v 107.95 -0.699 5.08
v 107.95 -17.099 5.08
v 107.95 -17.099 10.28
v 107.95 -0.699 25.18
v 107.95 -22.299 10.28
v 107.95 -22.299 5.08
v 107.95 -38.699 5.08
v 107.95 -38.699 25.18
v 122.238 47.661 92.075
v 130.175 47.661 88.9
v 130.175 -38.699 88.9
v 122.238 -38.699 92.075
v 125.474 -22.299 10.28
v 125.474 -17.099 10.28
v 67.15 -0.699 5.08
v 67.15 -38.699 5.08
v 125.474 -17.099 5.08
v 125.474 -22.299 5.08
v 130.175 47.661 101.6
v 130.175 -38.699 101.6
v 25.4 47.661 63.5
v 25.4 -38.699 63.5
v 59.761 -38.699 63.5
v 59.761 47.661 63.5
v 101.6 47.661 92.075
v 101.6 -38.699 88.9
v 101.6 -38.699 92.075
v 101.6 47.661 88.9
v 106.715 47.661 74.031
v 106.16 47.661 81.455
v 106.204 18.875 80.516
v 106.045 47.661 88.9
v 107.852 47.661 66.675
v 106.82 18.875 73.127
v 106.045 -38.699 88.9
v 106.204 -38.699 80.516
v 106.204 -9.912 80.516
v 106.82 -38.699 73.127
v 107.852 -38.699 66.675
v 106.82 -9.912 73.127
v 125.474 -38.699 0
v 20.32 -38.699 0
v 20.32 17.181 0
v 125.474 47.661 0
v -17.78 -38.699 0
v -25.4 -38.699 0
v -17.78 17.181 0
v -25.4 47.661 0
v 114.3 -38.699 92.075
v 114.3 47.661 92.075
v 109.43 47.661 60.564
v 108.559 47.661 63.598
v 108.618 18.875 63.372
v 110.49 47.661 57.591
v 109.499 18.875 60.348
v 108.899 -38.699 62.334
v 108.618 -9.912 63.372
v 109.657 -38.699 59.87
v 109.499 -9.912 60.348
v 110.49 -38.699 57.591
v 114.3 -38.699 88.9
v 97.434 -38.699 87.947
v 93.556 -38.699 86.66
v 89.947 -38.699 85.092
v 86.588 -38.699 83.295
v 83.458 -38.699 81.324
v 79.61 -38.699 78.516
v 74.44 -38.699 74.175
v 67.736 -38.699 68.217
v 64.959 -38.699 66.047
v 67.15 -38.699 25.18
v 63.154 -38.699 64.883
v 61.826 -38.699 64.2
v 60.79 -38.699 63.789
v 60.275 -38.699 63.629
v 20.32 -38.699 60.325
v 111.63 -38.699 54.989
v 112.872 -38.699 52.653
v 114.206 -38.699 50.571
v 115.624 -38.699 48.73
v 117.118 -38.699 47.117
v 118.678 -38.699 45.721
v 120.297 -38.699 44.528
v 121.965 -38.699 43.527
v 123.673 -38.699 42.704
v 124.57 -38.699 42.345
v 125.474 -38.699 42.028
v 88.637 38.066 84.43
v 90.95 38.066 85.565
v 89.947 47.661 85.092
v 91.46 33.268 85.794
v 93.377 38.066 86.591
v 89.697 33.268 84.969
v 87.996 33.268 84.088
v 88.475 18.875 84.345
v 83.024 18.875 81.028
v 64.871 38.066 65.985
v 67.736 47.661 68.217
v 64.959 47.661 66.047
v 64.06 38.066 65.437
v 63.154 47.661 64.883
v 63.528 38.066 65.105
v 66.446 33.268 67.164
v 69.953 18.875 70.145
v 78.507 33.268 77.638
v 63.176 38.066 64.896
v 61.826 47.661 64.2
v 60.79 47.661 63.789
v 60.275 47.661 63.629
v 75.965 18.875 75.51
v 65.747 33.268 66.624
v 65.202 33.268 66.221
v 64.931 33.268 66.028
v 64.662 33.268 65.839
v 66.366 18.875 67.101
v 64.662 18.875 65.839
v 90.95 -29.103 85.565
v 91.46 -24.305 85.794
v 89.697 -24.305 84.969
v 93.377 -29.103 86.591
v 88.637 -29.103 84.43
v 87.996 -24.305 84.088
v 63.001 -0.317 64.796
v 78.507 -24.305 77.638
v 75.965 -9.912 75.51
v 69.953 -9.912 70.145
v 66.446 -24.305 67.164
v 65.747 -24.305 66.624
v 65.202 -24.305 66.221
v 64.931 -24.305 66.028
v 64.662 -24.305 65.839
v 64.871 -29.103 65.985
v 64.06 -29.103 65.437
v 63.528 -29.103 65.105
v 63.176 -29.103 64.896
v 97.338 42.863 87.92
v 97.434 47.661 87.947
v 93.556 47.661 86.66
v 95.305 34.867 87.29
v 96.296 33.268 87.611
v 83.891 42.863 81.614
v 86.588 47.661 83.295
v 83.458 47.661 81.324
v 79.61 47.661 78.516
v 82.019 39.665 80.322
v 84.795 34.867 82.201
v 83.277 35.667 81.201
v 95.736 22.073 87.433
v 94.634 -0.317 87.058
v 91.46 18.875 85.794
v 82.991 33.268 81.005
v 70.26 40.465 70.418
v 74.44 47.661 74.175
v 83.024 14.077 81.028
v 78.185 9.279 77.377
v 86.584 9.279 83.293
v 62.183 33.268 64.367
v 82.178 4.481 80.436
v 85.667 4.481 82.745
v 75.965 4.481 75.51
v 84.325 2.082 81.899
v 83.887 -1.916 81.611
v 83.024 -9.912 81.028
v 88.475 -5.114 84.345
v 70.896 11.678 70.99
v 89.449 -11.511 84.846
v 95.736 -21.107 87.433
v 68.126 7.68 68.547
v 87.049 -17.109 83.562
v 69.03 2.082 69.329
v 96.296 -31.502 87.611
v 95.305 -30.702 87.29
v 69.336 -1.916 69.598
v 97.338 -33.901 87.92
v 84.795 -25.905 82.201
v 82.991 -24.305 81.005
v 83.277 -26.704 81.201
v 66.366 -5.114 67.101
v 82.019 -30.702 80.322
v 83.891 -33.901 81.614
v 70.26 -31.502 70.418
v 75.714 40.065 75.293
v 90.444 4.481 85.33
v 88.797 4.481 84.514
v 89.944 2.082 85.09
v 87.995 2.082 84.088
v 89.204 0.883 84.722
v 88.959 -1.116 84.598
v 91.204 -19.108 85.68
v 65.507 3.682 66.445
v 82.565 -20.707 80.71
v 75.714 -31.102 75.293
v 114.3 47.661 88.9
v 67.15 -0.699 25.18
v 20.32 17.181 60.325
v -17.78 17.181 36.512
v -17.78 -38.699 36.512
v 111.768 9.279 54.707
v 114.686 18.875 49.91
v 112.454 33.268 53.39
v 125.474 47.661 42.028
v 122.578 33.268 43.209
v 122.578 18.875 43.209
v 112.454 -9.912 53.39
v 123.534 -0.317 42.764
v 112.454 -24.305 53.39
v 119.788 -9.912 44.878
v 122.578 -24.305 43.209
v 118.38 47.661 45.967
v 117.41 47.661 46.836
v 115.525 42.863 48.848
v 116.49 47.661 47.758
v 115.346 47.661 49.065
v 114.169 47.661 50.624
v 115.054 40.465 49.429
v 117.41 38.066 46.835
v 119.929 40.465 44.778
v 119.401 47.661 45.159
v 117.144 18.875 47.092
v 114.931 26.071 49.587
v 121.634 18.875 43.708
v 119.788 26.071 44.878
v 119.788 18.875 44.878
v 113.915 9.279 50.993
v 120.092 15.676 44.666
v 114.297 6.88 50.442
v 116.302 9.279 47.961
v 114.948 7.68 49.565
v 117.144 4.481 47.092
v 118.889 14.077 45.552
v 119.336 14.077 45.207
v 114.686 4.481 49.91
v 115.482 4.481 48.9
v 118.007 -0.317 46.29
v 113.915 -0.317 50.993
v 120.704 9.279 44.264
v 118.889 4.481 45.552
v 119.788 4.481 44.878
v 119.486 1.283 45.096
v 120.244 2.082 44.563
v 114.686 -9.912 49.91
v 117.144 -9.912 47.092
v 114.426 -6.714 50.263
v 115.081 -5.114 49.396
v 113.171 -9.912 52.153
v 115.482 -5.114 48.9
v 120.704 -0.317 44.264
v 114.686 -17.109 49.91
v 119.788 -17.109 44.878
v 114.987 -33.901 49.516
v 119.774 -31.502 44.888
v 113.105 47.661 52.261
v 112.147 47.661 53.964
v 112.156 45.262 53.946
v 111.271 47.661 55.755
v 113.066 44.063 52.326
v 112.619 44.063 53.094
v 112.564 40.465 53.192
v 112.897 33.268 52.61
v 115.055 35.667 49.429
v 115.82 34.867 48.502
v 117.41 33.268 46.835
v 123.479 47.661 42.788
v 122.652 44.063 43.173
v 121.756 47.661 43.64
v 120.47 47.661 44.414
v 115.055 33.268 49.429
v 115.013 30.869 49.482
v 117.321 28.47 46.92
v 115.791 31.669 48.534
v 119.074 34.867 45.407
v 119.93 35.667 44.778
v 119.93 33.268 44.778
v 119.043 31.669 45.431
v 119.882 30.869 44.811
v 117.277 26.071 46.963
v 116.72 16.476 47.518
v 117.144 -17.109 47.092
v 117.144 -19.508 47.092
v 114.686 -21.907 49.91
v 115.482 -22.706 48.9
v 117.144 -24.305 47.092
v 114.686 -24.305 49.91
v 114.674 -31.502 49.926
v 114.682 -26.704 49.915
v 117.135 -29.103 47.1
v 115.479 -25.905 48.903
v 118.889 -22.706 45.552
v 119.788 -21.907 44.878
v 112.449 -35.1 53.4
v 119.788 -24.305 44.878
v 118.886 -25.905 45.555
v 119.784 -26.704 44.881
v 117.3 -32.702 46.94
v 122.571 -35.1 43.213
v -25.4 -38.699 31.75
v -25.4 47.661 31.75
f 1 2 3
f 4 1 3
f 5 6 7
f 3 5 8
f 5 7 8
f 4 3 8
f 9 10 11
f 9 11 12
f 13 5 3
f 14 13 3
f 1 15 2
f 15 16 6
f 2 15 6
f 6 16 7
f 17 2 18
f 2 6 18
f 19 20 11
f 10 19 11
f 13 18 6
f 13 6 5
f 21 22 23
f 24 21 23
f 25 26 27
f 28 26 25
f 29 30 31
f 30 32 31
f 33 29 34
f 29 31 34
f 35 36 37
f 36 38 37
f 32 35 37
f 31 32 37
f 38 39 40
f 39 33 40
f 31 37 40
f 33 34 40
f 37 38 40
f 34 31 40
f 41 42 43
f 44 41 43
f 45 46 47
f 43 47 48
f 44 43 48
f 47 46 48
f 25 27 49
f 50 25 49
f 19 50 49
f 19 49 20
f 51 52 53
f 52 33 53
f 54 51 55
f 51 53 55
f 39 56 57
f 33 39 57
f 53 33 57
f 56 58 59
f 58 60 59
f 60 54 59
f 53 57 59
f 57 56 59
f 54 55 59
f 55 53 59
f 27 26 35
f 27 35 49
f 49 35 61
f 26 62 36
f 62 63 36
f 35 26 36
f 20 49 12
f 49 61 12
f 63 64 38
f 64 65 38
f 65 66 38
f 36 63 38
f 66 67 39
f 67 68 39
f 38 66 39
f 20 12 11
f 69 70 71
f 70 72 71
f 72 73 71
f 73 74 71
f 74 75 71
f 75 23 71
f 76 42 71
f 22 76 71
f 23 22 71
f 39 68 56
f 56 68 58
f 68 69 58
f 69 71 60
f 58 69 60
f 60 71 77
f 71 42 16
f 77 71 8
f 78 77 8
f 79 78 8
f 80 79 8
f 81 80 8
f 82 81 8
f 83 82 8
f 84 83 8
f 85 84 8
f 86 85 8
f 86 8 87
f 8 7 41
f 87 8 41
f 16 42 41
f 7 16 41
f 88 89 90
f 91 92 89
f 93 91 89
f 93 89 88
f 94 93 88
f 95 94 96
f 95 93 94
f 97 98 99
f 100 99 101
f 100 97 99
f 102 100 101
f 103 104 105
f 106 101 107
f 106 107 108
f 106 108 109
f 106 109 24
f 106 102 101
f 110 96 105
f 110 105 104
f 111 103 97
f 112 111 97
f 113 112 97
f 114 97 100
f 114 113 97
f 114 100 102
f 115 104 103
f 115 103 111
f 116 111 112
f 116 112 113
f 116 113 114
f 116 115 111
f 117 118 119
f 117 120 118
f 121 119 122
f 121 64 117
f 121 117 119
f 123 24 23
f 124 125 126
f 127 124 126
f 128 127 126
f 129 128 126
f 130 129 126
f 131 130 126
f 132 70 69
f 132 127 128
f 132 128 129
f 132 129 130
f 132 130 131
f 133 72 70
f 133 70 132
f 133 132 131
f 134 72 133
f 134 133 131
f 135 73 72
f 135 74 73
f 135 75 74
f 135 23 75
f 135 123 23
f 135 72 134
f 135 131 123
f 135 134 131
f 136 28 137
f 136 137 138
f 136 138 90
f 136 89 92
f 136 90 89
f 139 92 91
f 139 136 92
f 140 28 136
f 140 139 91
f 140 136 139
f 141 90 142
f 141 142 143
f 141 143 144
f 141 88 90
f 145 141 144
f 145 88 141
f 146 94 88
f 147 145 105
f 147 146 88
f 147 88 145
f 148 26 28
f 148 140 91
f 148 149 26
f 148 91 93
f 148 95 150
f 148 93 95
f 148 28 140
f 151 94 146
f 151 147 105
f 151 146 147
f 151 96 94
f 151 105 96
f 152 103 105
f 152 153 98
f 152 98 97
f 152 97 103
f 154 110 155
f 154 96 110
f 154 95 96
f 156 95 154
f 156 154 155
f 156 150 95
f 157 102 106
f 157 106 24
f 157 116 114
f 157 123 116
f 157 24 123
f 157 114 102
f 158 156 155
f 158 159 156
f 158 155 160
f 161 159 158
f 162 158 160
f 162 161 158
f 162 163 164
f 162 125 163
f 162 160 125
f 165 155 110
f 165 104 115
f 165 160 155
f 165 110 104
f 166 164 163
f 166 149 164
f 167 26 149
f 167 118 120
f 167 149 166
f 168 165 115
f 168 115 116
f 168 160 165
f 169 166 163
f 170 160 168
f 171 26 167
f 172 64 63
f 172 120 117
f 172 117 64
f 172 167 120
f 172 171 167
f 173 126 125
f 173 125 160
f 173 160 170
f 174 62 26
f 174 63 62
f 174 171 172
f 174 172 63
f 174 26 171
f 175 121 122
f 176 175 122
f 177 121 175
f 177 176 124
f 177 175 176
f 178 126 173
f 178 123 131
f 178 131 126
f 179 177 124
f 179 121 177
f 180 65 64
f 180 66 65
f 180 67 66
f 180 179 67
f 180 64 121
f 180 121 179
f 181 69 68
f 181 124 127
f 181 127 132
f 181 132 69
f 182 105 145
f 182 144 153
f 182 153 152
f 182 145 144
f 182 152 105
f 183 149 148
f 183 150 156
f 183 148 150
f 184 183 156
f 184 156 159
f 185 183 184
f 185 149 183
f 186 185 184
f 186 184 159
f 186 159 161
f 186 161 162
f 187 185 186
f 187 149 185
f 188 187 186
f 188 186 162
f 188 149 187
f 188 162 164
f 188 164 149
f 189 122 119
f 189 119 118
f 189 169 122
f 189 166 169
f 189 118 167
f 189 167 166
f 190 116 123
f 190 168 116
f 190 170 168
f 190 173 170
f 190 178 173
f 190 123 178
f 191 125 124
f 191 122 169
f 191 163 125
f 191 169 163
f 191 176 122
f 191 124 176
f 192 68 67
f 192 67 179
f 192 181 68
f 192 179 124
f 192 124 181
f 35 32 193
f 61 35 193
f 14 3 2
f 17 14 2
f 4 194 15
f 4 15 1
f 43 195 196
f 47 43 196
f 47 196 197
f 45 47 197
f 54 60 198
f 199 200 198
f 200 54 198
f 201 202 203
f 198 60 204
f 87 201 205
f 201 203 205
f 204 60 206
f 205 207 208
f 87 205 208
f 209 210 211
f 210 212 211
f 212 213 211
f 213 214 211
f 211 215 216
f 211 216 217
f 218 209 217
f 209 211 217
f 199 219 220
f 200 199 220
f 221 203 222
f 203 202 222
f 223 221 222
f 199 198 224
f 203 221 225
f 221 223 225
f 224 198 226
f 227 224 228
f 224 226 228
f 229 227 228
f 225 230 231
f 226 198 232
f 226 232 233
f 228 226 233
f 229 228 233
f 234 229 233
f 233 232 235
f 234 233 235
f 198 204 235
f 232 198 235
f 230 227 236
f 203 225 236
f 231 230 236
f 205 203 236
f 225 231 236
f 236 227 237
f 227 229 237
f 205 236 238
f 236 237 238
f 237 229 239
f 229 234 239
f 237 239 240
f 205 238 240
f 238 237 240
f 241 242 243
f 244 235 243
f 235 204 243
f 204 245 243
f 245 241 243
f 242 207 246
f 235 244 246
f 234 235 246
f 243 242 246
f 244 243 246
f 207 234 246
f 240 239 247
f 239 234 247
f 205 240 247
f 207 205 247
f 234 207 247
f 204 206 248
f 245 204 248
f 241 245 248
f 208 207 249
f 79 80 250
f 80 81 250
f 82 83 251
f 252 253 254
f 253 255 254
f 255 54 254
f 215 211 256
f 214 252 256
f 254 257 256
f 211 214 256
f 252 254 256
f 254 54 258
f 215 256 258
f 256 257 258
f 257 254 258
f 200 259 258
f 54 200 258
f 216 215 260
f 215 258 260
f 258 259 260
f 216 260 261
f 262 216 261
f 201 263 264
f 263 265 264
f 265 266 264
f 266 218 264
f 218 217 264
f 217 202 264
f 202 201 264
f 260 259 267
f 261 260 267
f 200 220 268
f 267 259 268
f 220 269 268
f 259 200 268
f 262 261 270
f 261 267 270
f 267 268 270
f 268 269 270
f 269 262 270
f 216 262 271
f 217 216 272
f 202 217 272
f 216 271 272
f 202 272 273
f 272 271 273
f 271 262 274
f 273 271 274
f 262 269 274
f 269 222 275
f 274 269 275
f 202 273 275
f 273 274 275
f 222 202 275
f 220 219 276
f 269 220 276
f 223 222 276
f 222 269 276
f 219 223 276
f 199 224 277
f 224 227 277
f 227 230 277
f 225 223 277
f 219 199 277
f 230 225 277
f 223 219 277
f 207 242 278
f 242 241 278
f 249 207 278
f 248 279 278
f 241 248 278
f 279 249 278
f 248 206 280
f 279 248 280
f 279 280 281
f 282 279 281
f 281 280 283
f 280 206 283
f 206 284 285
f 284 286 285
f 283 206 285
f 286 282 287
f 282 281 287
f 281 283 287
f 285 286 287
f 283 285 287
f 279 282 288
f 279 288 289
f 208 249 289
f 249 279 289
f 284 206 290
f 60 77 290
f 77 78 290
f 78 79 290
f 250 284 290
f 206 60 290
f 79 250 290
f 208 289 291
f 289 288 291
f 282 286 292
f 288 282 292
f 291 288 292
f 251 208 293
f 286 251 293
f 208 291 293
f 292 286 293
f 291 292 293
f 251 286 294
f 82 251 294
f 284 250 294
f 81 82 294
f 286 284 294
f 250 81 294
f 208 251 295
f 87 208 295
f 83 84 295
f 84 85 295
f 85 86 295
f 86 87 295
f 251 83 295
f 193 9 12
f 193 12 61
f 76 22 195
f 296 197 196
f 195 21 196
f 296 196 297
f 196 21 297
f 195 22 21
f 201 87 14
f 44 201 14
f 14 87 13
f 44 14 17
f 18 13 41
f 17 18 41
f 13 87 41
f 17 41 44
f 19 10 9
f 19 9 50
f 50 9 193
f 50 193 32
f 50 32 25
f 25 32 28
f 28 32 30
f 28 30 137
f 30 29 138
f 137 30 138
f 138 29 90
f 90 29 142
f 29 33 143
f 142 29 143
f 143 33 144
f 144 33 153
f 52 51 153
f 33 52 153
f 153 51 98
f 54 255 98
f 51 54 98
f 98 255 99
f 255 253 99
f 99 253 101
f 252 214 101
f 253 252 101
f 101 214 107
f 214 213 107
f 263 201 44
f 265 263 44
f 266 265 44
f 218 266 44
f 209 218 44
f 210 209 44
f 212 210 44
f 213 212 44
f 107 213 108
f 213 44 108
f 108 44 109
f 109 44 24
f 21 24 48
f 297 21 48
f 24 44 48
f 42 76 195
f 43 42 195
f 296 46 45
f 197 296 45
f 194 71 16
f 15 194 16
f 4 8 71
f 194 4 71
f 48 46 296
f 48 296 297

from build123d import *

# Parameters (mm, degrees)
F0_W      = 50.8
F0_H      = 86.36
F1_DEPTH  = 63.5
F2_W      = 20.32
F2_H      = 43.18
F2_W_2    = 17.78
F2_H_2    = 12.7
F3_DEPTH  = 228.6
F5_DEPTH  = 228.6
F6_W      = 86.36
F6_H      = 50.8
F6_H_2    = 63.5
F7_DEPTH  = 127
F9_W      = 127
F9_H      = 50.8
F10_DEPTH = 228.6
F12_DEPTH = 37.999924
F13_DEPTH = 86.36
F15_DEPTH = 101.6
F16_W     = 41.91
F16_H     = 22.225
F17_DEPTH = 228.6
F18_W     = 46.355
F18_H     = 86.36
F18_W_2   = 4.445
F19_DEPTH = 12.7
F20_W     = 12.7
F20_H     = 9.525
F20_W_2   = 3.175
F20_W_3   = 6.35
F20_H_2   = 3.175
F21_DEPTH = 228.6
F23_DEPTH = 228.6
F25_DEPTH = 59.69


with BuildPart() as f1:
    # F0 (on Top) → F1 (new body)
    with BuildSketch(Plane.XY):
        with Locations((0, 4.4812522829)):
            Rectangle(F0_W, F0_H)
    extrude(amount=F1_DEPTH)

    # F2 (on face) → F3 (cut)
    with BuildSketch(Plane.XY.offset(63.5)):
        with Locations((10.16, -17.1087477171)):
            Rectangle(F2_W, F2_H)
        with Locations((-8.89, -17.1087477171)):
            Rectangle(F2_W_2, F2_H)
        with Locations((-8.89, 10.8312522829)):
            Rectangle(F2_W_2, F2_H_2)
        with Locations((10.16, 10.8312522829)):
            Rectangle(F2_W, F2_H_2)
    extrude(amount=-F3_DEPTH, mode=Mode.SUBTRACT)

    # F4 (on face) → F5 (cut)
    with BuildSketch(Plane(origin=(0, 47.6612522829, 0), x_dir=(-1, 0, 0), z_dir=(0, 1, 0))):
        Polygon((-25.4, 63.5), (25.4, 31.75), (25.4, 63.5), align=None)
    extrude(amount=-F5_DEPTH, mode=Mode.SUBTRACT)

    # F6 (on face) → F7 (join)
    with BuildSketch(Plane.YZ.offset(25.4)):
        with Locations((4.4812522829, 88.9)):
            Rectangle(F6_W, F6_H)
        with Locations((4.4812522829, 31.75)):
            Rectangle(F6_W, F6_H_2)
    extrude(amount=F7_DEPTH)

    # F9 (on face) → F10 (cut)
    with BuildSketch(Plane.XZ.offset(38.6987477171)):
        with Locations((88.9, 88.9)):
            Rectangle(F9_W, F9_H)
    extrude(amount=-F10_DEPTH, mode=Mode.SUBTRACT)

    # F11 (on face) → F12 (cut)
    with BuildSketch(Plane.XZ.offset(38.6987477171)):
        Polygon((107.95, 5.08), (107.95, 13.3552532643), (107.95, 25.18000044), (67.1500054, 25.18000044), (67.1500054, 5.08), align=None)
    extrude(amount=-F12_DEPTH, mode=Mode.SUBTRACT)

    # F8 (on face) → F13 (join)
    with BuildSketch(Plane.XZ.offset(38.6987477171)):
        with BuildLine():
            Line((59.7608433873, 63.5), (101.6, 63.5))
            Line((101.6, 63.5), (101.6, 88.9))
            add(Edge.make_bspline(
                [(101.6, 88.9), (79.3954620772, 84.9506698417), (69.3900678517, 65.6088911006), (59.7608433873, 63.5)],
                knots=[0, 0, 0, 0, 0.338800951, 0.338800951, 0.338800951, 0.338800951], degree=3))
        make_face()
        Polygon((101.6, 88.9), (101.6, 63.5), (152.4, 63.5), (152.4, 114.3), (101.6, 114.3), align=None)
    extrude(amount=-F13_DEPTH)

    # F14 (on face) → F15 (cut)
    with BuildSketch(Plane.YZ.offset(152.4)):
        Polygon((47.6612522829, 114.3), (-38.6987477171, 114.3), (-38.6987477171, 88.9), (47.6612522829, 88.9), (47.6612522829, 101.6), align=None)
    extrude(amount=-F15_DEPTH, mode=Mode.SUBTRACT)

    # F16 (on face) → F17 (cut)
    with BuildSketch(Plane.XZ.offset(38.6987477171)):
        with BuildLine():
            Line((110.49, 88.9), (106.045, 88.9))
            add(Edge.make_bspline(
                [(106.045, 88.9), (105.9615328839, 79.9996478624), (106.6244970851, 72.6786467547), (107.8523208869, 66.675)],
                knots=[0, 0, 0, 0, 0.1081078186, 0.1081078186, 0.1081078186, 0.1081078186], degree=3))
            Line((107.8523208869, 66.675), (110.49, 66.675))
            Line((110.49, 66.675), (110.49, 88.9))
        make_face()
        with Locations((131.445, 77.7875)):
            Rectangle(F16_W, F16_H)
        with BuildLine():
            add(Edge.make_bspline(
                [(125.4735723701, 42.0280762083), (135.9858471133, 38.600025516), (147.748179628, 43.4285939835), (152.4, 44.45)],
                knots=[0.3864894569, 0.3864894569, 0.3864894569, 0.3864894569, 0.7739727648, 0.7739727648, 0.7739727648, 0.7739727648], degree=3))
            Line((125.4735723701, 42.0280762083), (125.4735723701, 0))
            Line((125.4735723701, 0), (152.4, 0))
            Line((152.4, 0), (152.4, 44.45))
        make_face()
        with BuildLine():
            Line((152.4, 66.675), (110.49, 66.675))
            Line((110.49, 66.675), (110.49, 57.590838654))
            add(Edge.make_bspline(
                [(110.49, 57.590838654), (114.1247988782, 48.4297517127), (119.6043502671, 43.9420283629), (125.4735723701, 42.0280762083)],
                knots=[0.1701494495, 0.1701494495, 0.1701494495, 0.1701494495, 0.3864894569, 0.3864894569, 0.3864894569, 0.3864894569], degree=3))
            add(Edge.make_bspline(
                [(125.4735723701, 42.0280762083), (135.9858471133, 38.600025516), (147.748179628, 43.4285939835), (152.4, 44.45)],
                knots=[0.3864894569, 0.3864894569, 0.3864894569, 0.3864894569, 0.7739727648, 0.7739727648, 0.7739727648, 0.7739727648], degree=3))
            Line((152.4, 44.45), (152.4, 66.675))
        make_face()
        with BuildLine():
            Line((110.49, 66.675), (107.8523208869, 66.675))
            add(Edge.make_bspline(
                [(107.8523208869, 66.675), (108.556952542, 63.2295874388), (109.4476183658, 60.2180400746), (110.49, 57.590838654)],
                knots=[0.1081078186, 0.1081078186, 0.1081078186, 0.1081078186, 0.1701494495, 0.1701494495, 0.1701494495, 0.1701494495], degree=3))
            Line((110.49, 57.590838654), (110.49, 66.675))
        make_face()
    extrude(amount=-F17_DEPTH, mode=Mode.SUBTRACT)

    # F18 (on face) → F19 (join)
    with BuildSketch(Plane.XY.offset(88.9)):
        with Locations((129.2225, 4.4812522829)):
            Rectangle(F18_W, F18_H)
        with Locations((103.8225, 4.4812522829)):
            Rectangle(F18_W_2, F18_H)
    extrude(amount=F19_DEPTH)

    # F20 (on face) → F21 (cut)
    with BuildSketch(Plane.XZ.offset(38.6987477171)):
        with Locations((107.95, 96.8375)):
            Rectangle(F20_W, F20_H)
        Polygon((127, 99.695), (127, 101.6), (114.3, 101.6), (114.3, 92.075), align=None)
        Polygon((127, 99.695), (130.175, 101.6), (127, 101.6), align=None)
        with Locations((131.7625, 96.8375)):
            Rectangle(F20_W_2, F20_H)
        with Locations((136.525, 96.8375)):
            Rectangle(F20_W_3, F20_H)
        with Locations((131.7625, 90.4875)):
            Rectangle(F20_W_2, F20_H_2)
        with Locations((136.525, 90.4875)):
            Rectangle(F20_W_3, F20_H_2)
        Polygon((152.4, 95.25), (152.4, 101.6), (139.7, 101.6), (139.7, 92.075), (152.4, 92.075), align=None)
        with Locations((146.05, 90.4875)):
            Rectangle(F20_W, F20_H_2)
    extrude(amount=-F21_DEPTH, mode=Mode.SUBTRACT)

    # F22 (on face) → F23 (cut)
    with BuildSketch(Plane.XZ.offset(38.6987477171)):
        Polygon((122.2375, 92.075), (114.3, 88.9), (130.175, 88.9), align=None)
    extrude(amount=-F23_DEPTH, mode=Mode.SUBTRACT)

    # F24 (on face) → F25 (cut)
    with BuildSketch(Plane(origin=(107.95, 0, 0), x_dir=(0, -1, 0), z_dir=(-1, 0, 0))):
        Polygon((22.0737809671, 5.08), (22.2987805171, 5.08), (22.2987805171, 10.2799896), (17.0987909171, 10.2799896), (17.0987909171, 5.08), (17.3237904671, 5.08), (19.6987857171, 5.08), align=None)
    extrude(amount=-F25_DEPTH, mode=Mode.SUBTRACT)


solid = f1.part
